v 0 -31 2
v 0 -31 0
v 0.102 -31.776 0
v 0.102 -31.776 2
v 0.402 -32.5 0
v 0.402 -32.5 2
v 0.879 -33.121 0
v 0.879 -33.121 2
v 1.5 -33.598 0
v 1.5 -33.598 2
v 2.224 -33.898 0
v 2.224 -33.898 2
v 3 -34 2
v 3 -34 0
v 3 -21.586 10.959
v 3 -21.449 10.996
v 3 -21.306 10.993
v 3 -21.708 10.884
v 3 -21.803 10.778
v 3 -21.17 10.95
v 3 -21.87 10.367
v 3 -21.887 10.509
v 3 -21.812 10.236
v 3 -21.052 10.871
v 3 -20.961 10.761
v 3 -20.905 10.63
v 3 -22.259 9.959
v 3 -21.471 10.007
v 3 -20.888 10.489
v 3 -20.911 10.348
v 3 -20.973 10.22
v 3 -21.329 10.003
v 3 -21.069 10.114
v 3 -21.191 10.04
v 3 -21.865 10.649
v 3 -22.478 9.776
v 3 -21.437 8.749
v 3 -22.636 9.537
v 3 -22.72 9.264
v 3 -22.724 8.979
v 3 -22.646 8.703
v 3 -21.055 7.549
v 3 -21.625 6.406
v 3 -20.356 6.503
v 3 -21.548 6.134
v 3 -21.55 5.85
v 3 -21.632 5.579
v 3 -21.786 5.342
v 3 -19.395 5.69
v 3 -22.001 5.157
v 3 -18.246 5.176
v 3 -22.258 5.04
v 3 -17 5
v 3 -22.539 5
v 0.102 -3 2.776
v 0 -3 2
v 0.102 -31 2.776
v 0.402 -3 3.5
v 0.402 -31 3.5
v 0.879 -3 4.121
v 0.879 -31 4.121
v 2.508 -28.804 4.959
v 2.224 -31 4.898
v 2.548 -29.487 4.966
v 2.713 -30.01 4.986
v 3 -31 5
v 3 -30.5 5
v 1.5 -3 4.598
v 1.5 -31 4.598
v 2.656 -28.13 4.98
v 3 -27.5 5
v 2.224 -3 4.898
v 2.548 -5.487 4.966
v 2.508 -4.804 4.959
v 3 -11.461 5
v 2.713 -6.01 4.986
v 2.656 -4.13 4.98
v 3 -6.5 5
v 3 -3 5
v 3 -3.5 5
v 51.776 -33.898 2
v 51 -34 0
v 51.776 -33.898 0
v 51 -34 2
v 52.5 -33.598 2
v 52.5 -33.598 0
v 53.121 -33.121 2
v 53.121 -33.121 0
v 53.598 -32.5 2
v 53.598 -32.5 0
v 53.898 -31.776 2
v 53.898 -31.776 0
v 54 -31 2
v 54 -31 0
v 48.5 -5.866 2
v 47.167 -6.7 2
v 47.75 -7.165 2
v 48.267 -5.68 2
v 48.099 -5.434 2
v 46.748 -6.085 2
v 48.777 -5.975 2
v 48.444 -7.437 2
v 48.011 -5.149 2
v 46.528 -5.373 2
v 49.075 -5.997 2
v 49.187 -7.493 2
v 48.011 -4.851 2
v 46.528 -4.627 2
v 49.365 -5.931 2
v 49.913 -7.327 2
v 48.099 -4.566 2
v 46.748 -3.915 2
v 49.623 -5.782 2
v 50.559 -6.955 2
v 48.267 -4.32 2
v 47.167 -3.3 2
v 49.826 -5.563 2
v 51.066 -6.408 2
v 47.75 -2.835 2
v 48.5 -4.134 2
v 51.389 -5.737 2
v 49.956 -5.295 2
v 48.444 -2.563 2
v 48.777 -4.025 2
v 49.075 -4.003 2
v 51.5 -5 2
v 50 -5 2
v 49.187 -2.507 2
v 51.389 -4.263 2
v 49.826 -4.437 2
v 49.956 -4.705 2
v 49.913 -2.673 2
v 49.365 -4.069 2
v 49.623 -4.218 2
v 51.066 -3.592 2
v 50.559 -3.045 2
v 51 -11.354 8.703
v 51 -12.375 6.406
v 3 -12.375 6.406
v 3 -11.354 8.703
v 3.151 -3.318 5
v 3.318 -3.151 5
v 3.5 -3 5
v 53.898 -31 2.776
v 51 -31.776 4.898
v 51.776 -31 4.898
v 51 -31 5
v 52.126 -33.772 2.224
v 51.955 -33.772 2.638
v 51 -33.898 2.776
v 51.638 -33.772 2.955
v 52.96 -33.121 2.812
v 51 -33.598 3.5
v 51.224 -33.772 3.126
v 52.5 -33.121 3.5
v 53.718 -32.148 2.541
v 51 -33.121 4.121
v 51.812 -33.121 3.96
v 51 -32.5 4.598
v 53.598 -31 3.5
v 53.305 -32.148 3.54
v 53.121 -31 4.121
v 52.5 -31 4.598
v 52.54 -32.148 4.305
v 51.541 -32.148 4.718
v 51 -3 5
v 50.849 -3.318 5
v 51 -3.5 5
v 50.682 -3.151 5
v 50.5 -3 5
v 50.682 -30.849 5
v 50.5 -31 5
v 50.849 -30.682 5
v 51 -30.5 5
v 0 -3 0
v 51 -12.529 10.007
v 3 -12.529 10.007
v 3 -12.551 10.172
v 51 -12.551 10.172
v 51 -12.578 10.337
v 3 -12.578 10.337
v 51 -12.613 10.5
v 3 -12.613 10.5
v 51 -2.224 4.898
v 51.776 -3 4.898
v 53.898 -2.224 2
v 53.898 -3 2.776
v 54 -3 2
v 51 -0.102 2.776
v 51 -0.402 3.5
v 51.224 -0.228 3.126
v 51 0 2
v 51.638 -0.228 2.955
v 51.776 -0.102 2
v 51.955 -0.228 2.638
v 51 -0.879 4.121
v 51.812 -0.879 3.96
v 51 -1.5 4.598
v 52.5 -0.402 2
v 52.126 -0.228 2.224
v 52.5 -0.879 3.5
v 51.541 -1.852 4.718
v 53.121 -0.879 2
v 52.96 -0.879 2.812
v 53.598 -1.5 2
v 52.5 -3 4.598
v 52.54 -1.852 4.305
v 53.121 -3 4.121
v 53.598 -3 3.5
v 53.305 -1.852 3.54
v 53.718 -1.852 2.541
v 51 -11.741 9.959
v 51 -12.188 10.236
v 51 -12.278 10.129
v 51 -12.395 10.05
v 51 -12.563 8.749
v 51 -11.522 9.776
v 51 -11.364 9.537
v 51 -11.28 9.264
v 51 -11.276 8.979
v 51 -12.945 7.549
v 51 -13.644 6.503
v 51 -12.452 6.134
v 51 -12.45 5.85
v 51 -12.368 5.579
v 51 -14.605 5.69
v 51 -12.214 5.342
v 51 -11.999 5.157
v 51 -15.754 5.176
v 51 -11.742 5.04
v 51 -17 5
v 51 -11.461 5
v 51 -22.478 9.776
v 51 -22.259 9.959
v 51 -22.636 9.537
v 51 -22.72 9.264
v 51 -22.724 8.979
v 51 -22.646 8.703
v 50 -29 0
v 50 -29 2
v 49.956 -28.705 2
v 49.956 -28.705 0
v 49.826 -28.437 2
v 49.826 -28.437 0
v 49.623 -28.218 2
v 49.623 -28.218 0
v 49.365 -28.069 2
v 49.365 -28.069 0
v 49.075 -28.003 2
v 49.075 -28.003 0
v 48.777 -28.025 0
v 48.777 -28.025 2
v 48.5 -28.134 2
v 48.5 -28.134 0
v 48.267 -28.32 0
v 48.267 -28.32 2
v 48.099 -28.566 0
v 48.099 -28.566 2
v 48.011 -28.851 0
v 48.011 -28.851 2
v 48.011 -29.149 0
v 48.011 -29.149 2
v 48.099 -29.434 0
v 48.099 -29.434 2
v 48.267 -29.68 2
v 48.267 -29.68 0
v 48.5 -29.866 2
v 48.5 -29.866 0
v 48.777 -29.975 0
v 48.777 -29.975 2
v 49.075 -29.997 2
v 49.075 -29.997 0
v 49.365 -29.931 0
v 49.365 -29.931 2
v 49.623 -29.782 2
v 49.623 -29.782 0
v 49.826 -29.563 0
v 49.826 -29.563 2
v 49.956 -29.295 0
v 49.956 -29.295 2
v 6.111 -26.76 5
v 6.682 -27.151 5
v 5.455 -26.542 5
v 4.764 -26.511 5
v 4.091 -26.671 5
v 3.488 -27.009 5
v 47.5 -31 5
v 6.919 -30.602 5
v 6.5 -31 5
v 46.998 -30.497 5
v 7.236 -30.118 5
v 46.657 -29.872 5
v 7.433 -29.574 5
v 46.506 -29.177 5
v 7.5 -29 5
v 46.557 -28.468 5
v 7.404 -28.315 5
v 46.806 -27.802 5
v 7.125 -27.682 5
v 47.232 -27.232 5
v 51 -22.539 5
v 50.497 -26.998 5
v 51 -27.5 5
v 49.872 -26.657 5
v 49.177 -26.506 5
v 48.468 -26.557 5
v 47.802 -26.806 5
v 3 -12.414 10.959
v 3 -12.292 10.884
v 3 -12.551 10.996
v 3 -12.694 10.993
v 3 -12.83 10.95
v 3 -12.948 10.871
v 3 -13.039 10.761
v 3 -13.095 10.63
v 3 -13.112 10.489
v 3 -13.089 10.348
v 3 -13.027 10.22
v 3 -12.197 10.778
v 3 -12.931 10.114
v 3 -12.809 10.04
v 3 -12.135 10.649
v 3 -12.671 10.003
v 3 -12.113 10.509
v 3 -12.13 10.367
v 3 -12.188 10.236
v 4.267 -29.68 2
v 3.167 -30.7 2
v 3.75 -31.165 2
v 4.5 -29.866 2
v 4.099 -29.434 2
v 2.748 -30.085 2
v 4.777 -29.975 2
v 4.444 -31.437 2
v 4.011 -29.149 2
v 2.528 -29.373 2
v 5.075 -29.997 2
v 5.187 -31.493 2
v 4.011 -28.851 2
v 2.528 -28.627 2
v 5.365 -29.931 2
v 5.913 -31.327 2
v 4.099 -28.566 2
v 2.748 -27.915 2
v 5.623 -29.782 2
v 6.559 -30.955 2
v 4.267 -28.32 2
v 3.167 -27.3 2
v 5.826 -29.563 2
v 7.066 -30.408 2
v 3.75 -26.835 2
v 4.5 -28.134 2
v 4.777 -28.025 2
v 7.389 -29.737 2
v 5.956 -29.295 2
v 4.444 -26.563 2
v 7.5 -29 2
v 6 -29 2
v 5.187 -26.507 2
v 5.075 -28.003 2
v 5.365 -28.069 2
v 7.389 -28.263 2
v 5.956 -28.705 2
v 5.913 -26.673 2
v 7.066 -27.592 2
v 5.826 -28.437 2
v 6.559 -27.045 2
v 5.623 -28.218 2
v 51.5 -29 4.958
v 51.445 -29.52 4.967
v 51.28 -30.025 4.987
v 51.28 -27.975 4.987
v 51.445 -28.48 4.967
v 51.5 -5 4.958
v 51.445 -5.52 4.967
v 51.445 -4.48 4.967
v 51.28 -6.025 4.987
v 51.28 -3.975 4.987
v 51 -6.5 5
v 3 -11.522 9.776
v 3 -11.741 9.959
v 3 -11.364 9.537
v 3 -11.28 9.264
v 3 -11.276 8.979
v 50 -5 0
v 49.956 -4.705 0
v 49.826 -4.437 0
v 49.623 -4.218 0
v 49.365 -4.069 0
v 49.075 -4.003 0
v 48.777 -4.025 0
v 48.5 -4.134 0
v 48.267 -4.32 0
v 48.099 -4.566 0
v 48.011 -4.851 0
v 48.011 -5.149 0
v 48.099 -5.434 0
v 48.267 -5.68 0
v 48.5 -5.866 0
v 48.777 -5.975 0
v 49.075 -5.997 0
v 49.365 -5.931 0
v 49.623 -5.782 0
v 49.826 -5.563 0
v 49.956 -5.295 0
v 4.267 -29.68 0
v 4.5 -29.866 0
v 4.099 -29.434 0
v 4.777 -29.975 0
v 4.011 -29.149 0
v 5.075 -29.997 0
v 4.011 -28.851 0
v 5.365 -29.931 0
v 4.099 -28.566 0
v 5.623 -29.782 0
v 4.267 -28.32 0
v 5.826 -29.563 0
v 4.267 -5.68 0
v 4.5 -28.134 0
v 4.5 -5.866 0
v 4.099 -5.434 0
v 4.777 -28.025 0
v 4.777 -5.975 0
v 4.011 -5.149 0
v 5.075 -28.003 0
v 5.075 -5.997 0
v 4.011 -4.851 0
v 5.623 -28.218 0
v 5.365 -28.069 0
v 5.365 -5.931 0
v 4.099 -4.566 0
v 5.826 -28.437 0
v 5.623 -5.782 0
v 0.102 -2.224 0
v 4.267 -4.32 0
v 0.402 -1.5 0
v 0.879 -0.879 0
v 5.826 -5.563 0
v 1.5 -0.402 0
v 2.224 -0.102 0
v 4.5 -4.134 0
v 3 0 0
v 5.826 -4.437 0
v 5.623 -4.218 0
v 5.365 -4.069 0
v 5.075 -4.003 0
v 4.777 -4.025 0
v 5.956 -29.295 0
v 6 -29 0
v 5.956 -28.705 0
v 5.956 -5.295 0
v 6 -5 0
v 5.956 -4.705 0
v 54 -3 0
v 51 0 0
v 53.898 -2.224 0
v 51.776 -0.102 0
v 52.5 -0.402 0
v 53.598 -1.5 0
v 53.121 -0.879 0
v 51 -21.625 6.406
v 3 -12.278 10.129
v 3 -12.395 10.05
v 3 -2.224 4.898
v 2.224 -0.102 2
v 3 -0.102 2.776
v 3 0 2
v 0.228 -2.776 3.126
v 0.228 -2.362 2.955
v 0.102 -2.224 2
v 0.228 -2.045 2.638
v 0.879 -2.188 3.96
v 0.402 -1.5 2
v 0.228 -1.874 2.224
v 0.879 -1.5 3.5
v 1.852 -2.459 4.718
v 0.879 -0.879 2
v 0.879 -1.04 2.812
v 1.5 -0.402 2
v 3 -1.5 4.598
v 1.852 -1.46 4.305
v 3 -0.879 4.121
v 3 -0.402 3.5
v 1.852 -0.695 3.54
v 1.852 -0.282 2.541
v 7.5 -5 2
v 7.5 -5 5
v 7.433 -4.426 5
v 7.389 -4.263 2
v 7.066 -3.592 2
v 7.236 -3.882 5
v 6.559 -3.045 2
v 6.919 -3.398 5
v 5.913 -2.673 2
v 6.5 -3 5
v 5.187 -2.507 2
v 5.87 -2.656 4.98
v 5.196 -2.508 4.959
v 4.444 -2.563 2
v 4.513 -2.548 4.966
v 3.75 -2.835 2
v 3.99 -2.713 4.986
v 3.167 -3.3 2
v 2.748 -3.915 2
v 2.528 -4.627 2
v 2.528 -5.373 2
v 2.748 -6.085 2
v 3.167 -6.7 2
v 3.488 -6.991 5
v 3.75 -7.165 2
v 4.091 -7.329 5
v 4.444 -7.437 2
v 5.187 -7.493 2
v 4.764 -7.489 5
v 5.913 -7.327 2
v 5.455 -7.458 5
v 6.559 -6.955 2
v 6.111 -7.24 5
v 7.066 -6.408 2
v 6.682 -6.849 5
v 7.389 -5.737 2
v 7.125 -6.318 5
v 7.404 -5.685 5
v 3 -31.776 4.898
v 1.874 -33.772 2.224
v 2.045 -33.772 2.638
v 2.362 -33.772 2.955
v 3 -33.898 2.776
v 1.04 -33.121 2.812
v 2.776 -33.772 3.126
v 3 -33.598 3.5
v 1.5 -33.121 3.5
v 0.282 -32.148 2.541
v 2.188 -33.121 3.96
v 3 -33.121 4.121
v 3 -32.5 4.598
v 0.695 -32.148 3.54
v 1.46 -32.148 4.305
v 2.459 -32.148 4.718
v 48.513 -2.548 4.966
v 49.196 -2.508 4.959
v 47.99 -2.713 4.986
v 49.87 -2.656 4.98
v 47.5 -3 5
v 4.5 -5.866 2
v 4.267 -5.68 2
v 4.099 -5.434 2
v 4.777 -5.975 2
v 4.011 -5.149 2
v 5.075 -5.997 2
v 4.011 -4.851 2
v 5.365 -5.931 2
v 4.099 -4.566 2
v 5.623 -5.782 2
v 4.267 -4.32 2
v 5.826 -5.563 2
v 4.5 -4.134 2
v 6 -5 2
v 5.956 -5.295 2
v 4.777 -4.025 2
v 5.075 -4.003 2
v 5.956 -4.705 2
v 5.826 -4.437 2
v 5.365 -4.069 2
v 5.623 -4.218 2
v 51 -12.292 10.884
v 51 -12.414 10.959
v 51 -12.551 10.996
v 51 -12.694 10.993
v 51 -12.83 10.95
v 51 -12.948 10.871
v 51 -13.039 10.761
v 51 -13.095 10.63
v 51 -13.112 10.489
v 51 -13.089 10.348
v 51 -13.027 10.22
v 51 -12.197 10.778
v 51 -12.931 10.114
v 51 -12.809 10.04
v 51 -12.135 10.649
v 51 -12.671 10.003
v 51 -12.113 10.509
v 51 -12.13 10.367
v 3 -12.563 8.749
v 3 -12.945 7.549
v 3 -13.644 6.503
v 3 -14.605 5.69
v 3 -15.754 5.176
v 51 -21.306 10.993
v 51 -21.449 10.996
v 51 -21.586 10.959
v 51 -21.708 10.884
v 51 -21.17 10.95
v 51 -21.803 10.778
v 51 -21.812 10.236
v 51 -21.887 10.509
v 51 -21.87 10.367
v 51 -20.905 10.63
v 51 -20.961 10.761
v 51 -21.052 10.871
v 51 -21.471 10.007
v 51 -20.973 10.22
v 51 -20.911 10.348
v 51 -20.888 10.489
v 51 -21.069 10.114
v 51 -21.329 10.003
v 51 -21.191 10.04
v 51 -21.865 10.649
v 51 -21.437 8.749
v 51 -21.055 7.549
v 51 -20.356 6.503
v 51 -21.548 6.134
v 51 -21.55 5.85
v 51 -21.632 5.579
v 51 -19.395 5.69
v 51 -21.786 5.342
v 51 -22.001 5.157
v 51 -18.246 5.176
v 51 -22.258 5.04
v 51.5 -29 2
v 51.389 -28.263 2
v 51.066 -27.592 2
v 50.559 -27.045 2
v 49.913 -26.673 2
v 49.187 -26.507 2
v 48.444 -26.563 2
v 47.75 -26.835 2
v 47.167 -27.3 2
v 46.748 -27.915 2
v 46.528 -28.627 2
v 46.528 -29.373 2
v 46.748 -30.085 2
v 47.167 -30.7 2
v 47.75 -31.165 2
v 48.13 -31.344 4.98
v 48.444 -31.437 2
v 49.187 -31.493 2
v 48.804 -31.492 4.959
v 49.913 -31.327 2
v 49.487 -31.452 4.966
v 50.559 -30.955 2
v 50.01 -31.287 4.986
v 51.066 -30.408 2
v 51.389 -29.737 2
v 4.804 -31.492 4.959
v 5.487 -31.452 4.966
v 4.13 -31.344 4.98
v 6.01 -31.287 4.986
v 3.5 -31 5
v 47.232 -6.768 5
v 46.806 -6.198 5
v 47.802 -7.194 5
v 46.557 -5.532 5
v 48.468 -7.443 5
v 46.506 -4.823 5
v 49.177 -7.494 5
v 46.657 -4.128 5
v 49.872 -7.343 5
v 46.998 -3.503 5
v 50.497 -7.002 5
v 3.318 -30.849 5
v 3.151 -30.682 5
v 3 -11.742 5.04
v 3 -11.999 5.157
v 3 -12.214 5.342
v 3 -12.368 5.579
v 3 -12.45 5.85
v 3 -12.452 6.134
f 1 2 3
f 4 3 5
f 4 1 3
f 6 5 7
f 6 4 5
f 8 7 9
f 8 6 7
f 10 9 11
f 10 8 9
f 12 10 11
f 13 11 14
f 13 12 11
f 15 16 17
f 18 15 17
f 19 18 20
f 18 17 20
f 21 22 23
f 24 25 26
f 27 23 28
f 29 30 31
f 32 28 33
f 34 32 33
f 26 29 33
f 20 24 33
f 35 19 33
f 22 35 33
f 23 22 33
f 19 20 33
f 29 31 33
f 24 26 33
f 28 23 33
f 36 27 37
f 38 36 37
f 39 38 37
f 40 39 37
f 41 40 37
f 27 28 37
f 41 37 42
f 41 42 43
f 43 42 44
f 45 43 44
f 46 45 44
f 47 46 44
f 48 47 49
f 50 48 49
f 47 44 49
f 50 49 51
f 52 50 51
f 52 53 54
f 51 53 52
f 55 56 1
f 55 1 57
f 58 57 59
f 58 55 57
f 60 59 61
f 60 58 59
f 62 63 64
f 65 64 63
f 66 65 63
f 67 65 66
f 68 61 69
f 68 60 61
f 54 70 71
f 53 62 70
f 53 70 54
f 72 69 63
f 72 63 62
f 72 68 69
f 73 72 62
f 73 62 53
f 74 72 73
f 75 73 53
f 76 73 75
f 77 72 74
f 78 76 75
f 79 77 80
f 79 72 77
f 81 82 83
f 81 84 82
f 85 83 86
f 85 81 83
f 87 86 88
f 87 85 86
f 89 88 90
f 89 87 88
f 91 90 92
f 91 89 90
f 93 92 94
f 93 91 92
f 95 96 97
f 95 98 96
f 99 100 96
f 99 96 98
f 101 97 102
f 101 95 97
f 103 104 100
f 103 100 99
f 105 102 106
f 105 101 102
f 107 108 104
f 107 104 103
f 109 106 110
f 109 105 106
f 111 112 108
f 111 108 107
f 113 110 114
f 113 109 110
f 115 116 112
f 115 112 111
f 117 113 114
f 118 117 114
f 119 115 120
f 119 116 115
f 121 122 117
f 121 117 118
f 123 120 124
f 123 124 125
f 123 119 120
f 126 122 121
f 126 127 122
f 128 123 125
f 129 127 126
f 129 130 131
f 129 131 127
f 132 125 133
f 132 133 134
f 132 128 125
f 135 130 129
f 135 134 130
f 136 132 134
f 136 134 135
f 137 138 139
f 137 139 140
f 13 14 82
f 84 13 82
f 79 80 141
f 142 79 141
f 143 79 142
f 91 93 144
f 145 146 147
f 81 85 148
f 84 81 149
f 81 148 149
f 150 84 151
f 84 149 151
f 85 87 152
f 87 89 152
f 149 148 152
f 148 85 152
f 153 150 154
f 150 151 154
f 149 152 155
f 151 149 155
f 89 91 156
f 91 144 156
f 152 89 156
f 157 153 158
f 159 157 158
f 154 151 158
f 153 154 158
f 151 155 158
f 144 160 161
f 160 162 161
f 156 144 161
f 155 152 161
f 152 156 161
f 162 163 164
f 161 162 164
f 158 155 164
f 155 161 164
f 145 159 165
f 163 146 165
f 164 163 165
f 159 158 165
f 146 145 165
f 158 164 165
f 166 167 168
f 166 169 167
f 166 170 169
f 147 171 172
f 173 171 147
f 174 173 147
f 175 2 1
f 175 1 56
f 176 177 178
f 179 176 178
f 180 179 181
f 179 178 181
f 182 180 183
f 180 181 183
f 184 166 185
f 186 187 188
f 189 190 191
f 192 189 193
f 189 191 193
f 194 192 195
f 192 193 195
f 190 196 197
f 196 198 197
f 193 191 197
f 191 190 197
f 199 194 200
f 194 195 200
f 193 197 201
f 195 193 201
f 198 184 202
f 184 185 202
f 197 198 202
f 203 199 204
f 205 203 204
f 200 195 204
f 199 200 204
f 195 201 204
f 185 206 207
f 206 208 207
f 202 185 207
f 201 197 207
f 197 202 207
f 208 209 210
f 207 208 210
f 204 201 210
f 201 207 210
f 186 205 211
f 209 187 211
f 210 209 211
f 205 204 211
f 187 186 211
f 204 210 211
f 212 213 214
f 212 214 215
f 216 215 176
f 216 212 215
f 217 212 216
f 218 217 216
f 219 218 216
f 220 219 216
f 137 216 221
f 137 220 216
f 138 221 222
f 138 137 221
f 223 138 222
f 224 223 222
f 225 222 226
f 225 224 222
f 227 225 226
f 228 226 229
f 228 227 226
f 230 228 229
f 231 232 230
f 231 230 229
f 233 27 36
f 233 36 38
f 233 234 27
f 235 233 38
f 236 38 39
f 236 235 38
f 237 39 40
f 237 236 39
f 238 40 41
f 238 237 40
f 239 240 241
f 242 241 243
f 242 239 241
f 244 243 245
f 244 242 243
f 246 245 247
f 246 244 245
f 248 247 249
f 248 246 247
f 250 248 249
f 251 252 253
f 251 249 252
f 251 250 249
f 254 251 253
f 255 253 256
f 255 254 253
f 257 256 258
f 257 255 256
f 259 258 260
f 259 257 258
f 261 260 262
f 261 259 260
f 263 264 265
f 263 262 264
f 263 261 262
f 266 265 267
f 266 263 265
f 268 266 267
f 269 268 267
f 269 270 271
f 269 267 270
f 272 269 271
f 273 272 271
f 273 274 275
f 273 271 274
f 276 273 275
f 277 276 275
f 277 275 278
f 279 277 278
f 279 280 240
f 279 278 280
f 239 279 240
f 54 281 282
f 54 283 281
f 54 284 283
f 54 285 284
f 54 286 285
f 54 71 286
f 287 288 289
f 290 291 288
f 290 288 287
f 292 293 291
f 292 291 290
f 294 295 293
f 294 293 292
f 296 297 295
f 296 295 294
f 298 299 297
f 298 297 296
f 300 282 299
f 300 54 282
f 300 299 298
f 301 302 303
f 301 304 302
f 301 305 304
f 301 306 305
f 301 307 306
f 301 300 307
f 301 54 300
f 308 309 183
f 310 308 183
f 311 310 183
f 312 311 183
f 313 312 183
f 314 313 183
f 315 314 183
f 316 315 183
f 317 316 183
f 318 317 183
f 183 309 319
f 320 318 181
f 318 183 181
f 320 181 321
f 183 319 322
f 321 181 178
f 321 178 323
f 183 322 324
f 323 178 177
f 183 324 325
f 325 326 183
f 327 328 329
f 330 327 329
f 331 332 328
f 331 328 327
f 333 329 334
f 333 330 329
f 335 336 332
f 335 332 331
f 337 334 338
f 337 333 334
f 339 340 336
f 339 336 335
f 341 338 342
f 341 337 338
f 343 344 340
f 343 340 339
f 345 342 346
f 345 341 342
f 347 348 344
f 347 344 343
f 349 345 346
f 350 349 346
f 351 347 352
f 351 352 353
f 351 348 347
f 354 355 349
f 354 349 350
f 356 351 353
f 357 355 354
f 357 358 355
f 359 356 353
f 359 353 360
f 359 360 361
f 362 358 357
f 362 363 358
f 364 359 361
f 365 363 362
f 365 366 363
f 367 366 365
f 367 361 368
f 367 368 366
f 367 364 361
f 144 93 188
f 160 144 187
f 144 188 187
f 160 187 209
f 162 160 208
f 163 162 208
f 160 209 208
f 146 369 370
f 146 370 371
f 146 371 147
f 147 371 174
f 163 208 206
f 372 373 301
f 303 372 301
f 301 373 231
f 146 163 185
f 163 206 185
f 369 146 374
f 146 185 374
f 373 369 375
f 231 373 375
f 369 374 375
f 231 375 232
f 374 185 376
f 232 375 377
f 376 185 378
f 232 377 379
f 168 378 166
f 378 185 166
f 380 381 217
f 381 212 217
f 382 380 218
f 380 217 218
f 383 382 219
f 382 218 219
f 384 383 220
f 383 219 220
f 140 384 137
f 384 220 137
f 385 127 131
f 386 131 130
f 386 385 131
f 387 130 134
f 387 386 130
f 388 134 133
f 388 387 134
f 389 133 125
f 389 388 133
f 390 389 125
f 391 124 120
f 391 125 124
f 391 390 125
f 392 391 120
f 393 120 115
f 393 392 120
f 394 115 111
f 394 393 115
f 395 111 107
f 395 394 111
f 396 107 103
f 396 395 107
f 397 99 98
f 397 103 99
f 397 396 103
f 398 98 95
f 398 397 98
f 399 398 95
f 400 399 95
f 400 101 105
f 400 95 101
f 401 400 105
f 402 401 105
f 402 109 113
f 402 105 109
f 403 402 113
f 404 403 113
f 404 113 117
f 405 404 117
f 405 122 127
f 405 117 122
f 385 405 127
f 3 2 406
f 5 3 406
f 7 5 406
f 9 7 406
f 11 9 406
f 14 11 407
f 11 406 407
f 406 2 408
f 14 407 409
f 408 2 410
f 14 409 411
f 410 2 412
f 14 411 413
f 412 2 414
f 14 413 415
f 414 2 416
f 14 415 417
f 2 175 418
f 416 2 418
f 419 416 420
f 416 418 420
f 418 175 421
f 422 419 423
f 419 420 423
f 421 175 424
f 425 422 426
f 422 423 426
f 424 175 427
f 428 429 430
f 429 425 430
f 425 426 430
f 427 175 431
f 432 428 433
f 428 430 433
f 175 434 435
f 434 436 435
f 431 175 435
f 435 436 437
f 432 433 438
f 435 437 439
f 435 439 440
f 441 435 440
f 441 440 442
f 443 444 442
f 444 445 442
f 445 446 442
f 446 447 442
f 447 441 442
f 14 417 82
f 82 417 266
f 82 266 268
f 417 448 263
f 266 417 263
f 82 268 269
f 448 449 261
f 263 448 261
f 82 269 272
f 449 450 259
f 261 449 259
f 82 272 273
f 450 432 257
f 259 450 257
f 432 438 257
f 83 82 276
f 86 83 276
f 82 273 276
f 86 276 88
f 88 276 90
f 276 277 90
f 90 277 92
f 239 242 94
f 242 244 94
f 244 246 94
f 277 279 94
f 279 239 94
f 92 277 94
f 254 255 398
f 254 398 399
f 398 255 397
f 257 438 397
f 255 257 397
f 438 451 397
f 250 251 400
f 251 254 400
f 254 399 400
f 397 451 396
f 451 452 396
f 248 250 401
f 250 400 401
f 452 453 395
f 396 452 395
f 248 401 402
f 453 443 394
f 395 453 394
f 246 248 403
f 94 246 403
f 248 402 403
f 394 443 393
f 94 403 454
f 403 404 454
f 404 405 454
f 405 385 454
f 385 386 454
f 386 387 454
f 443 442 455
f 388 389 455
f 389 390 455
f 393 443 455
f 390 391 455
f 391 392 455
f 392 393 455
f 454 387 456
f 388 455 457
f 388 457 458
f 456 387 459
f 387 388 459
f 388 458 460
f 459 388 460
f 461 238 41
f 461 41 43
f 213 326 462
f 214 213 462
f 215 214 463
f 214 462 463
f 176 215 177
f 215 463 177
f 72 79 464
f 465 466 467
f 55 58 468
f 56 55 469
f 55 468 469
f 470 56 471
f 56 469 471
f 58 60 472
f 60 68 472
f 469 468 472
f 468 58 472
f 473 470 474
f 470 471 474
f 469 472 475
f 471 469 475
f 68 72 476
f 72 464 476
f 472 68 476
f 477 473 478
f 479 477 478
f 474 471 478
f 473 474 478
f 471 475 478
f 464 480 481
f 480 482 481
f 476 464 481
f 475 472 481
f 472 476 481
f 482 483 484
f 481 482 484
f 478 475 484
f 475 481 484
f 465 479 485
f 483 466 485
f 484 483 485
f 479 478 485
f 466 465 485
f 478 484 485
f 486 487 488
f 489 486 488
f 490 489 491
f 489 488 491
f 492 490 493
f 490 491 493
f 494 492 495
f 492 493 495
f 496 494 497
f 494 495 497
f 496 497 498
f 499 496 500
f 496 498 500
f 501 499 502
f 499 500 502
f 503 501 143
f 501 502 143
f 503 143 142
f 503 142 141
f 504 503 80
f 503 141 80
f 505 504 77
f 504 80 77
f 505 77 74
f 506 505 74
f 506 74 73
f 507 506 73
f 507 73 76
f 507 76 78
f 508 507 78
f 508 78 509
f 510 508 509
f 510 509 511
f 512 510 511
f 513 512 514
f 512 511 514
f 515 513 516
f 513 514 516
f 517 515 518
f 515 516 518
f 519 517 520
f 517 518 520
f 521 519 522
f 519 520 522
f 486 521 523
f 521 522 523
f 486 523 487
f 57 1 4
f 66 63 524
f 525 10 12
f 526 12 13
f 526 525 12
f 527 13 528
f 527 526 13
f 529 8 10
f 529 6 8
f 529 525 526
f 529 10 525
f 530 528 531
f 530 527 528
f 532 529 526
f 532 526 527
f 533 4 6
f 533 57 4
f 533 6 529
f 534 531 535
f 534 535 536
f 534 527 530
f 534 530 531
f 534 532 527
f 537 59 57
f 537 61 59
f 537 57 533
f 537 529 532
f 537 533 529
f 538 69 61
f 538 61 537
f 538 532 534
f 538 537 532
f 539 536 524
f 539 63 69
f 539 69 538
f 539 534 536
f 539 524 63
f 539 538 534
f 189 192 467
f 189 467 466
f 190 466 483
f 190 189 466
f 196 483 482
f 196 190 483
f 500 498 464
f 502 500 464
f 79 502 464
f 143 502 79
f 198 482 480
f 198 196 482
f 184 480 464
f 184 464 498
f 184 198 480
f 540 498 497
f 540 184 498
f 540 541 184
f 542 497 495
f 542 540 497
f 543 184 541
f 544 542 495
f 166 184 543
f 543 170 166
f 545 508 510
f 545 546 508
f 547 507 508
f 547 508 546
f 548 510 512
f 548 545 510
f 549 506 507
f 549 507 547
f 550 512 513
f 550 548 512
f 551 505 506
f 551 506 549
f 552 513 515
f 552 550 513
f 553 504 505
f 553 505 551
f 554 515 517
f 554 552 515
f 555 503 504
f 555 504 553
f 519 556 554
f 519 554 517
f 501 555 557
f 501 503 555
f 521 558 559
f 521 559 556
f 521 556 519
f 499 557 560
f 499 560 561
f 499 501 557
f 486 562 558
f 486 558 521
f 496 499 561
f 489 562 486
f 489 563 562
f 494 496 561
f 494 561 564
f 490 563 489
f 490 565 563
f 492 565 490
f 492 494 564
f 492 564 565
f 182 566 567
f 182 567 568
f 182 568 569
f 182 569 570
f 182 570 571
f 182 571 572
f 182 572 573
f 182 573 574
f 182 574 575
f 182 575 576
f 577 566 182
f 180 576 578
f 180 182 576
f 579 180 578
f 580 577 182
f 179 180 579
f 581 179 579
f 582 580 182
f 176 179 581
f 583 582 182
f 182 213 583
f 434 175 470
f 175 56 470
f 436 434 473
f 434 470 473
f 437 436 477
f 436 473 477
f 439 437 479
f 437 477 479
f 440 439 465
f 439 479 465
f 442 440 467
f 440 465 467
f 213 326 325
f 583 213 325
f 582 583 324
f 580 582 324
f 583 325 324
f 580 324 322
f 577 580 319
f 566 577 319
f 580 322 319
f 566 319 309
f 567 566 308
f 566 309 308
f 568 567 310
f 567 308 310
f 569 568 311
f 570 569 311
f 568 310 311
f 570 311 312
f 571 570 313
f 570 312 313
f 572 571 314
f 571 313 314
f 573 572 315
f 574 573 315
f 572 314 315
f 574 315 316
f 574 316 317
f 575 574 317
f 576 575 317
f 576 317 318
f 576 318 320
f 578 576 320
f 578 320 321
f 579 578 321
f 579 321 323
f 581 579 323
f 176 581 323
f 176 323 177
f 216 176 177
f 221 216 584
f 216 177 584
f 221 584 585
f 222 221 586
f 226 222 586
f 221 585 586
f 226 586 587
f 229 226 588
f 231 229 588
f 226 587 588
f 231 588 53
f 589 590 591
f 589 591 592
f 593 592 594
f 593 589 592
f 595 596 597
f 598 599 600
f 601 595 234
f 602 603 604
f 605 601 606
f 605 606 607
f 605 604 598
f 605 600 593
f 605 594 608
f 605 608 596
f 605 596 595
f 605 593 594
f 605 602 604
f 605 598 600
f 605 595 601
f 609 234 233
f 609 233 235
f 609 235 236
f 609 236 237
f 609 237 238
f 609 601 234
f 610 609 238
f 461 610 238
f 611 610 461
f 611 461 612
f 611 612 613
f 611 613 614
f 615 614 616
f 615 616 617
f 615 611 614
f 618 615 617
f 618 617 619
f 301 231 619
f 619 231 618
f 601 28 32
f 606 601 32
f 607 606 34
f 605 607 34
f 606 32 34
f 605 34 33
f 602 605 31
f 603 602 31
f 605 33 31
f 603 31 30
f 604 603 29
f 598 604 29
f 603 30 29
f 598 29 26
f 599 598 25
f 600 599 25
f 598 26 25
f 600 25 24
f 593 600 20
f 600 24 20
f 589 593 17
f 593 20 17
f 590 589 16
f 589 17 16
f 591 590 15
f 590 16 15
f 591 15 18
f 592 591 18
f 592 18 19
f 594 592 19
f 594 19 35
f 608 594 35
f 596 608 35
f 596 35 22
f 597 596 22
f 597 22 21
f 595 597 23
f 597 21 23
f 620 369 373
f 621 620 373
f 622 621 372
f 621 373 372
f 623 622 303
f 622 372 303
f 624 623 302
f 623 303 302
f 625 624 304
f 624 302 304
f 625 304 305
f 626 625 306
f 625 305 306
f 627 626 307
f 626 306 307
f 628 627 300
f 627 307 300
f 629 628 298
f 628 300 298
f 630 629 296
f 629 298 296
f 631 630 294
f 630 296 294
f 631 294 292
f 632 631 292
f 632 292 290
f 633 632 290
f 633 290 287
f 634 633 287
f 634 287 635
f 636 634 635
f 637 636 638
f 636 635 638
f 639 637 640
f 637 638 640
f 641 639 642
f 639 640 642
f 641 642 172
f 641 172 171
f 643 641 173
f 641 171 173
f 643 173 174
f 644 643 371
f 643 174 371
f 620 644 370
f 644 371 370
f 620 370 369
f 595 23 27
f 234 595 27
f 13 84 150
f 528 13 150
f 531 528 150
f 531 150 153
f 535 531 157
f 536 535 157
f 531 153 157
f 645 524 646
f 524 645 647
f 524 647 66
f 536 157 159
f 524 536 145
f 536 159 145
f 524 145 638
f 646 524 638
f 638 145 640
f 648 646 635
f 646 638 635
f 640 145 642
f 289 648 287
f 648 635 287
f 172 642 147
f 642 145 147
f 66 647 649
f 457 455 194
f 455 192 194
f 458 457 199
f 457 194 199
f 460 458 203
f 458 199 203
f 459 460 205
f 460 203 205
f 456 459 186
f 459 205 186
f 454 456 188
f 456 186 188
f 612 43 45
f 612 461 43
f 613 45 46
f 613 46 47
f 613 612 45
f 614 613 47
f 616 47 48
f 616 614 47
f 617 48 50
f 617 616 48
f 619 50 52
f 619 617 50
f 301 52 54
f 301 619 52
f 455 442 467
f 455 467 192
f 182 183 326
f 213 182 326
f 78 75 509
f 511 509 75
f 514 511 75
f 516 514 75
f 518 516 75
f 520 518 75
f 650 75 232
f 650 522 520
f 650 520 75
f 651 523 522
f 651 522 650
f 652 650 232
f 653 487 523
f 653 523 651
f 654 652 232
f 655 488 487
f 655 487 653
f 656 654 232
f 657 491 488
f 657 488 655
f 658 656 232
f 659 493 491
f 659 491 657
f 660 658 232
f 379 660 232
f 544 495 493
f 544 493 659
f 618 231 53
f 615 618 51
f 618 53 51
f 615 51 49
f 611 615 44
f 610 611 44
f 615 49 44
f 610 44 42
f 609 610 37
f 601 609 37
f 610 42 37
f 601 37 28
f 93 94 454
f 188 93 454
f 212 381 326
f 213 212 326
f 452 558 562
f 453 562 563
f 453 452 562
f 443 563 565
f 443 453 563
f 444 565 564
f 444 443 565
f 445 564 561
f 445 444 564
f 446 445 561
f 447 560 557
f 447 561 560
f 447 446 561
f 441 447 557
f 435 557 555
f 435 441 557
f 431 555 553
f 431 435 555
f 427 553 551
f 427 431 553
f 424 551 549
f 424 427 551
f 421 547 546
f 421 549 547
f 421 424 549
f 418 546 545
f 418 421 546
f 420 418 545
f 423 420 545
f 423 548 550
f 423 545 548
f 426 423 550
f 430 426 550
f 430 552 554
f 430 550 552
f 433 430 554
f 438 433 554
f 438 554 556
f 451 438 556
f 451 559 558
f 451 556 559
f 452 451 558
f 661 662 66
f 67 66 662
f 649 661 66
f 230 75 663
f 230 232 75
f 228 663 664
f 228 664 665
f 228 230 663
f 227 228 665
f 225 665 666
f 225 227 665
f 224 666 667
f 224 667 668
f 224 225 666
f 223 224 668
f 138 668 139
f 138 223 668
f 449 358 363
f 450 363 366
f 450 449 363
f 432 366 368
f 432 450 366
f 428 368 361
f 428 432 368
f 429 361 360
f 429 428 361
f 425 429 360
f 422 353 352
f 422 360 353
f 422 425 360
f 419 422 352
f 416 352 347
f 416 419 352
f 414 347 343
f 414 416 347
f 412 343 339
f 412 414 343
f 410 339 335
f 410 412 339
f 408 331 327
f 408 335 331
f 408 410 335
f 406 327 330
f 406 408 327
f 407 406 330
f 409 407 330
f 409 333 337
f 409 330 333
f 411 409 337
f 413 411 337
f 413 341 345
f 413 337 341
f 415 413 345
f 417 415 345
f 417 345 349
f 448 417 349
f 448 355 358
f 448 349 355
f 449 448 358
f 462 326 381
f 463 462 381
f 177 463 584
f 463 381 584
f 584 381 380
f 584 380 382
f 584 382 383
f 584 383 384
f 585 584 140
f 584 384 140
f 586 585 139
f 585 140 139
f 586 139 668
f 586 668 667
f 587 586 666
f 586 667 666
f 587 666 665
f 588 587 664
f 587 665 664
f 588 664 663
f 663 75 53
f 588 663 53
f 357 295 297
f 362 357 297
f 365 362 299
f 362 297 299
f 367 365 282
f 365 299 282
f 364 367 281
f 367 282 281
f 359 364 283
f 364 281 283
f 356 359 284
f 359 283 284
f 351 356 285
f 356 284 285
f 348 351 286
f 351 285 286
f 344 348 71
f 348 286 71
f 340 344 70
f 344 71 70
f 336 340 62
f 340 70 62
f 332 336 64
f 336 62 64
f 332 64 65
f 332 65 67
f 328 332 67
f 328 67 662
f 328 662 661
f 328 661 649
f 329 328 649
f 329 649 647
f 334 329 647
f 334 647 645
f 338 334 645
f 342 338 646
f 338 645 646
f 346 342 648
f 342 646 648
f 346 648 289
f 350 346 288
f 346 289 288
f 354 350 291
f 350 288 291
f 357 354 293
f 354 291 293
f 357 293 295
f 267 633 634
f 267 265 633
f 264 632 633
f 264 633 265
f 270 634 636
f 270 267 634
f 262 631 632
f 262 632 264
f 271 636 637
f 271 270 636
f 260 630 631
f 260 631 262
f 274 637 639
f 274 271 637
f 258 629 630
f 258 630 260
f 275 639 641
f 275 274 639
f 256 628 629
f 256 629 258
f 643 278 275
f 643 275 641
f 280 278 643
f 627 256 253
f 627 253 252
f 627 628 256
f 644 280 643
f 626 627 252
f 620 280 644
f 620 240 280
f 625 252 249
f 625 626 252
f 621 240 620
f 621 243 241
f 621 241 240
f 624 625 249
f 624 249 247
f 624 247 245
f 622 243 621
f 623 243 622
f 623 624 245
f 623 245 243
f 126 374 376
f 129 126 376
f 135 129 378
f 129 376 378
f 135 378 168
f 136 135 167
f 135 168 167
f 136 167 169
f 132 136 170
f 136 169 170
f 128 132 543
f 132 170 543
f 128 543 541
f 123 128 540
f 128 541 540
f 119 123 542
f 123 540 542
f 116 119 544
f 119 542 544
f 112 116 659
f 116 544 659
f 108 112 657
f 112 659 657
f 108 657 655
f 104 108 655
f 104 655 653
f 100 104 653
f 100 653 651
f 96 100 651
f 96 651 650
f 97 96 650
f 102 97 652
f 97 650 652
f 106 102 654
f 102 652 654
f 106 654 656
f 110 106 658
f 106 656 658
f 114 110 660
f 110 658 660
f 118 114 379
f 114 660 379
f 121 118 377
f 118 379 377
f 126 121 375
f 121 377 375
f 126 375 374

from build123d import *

# Parameters (mm, degrees)
SKETCH1_W                = 54
SKETCH1_H                = 34
SKETCH1_R                = 1
BOSS_EXTRUDE1_DEPTH      = 5
FILLET2_R                = 3
SKETCH2_R                = 2.5
CUT_EXTRUDE1_DEPTH       = 3
BOSS_EXTRUDE2_DEPTH      = 7
BOSS_EXTRUDE2_DEPTH_BACK = 41
FILLET3_R                = 1


with BuildPart() as part:
    # Sketch1 → Boss-Extrude1 (new body)
    with BuildSketch(Plane.XY):
        with Locations((27, -17)):
            Rectangle(SKETCH1_W, SKETCH1_H)
        with Locations((5, -5)):
            Circle(SKETCH1_R, mode=Mode.SUBTRACT)
        with Locations((49, -5)):
            Circle(SKETCH1_R, mode=Mode.SUBTRACT)
        with Locations((49, -29)):
            Circle(SKETCH1_R, mode=Mode.SUBTRACT)
        with Locations((5, -29)):
            Circle(SKETCH1_R, mode=Mode.SUBTRACT)
    extrude(amount=BOSS_EXTRUDE1_DEPTH)

    # Fillet2
    fillet2_edges = [part.edges().sort_by_distance(p)[0] for p in [
        (54, -17, 5),
        (27, 0, 5),
        (0, -17, 5),
        (0, 0, 2.5),
        (54, 0, 2.5),
        (54, -34, 2.5),
        (0, -34, 2.5),
        (27, -34, 5),
    ]]
    fillet(fillet2_edges, radius=FILLET2_R)

    # Sketch2 → Cut-Extrude1 (cut)
    with BuildSketch(Plane.XY.offset(5)):
        with Locations((5, -5)):
            Circle(SKETCH2_R)
        with Locations((5, -29)):
            Circle(SKETCH2_R)
        with Locations((49, -29)):
            Circle(SKETCH2_R)
        with Locations((49, -5)):
            Circle(SKETCH2_R)
    extrude(amount=-CUT_EXTRUDE1_DEPTH, mode=Mode.SUBTRACT)

    # Sketch4 → Boss-Extrude2 (add, two sides: drawn at the far end of the back side and taken through both)
    with BuildSketch(Plane(origin=(44, 0, 0), x_dir=(0, 0, -1), z_dir=(1, 0, 0)).offset(-BOSS_EXTRUDE2_DEPTH_BACK)):
        with BuildLine():
            ThreePointArc((-10.007082032, -21.471338481), (-10.914884898, -21.108429294), (-10.236484682, -21.812405336))
            Line((-10.236484682, -21.812405336), (-9.5, -23))
            Line((-9.5, -23), (-5, -21))
            Line((-5, -21), (-5, -17))
            ThreePointArc((-5, -17), (-6.502656939, -20.356476512), (-10.007082032, -21.471338481))
        make_face()
        with BuildLine():
            ThreePointArc((-10.007082032, -12.528661519), (-6.502656939, -13.643523488), (-5, -17))
            Line((-5, -17), (-5, -13))
            Line((-5, -13), (-9.5, -11))
            Line((-9.5, -11), (-10.236484682, -12.187594664))
            ThreePointArc((-10.236484682, -12.187594664), (-10.085115102, -12.333464906), (-10.007082032, -12.528661519))
        make_face()
        with BuildLine():
            ThreePointArc((-10.236484682, -12.187594664), (-10.914884898, -12.891570706), (-10.007082032, -12.528661519))
            ThreePointArc((-10.007082032, -12.528661519), (-10.254706587, -12.563738289), (-10.5, -12.612517806))
            Line((-10.5, -12.612517806), (-10.236484682, -12.187594664))
        make_face()
    extrude(amount=BOSS_EXTRUDE2_DEPTH + BOSS_EXTRUDE2_DEPTH_BACK)


with BuildPart() as boss_extrude2_piece_1:
    # of the separate pieces the step leaves, piece 1, a body of its own (boss_extrude2_pieces)
    add(part.part.solids().sort_by_distance((3, 0, 0))[0])

    # Fillet3
    fillet3_edges = [boss_extrude2_piece_1.edges().sort_by_distance(p)[0] for p in [
        (27, -11, 9.5),
        (27, -13, 5),
        (27, -23, 9.5),
        (27, -21, 5),
    ]]
    fillet(fillet3_edges, radius=FILLET3_R)


with BuildPart() as boss_extrude2_piece_2:
    # of the separate pieces the step leaves, piece 2, a body of its own (boss_extrude2_pieces)
    add(part.part.solids().sort_by_distance((3, -12.612517806, 10.5))[0])


solid = Compound([boss_extrude2_piece_1.part, boss_extrude2_piece_2.part])
